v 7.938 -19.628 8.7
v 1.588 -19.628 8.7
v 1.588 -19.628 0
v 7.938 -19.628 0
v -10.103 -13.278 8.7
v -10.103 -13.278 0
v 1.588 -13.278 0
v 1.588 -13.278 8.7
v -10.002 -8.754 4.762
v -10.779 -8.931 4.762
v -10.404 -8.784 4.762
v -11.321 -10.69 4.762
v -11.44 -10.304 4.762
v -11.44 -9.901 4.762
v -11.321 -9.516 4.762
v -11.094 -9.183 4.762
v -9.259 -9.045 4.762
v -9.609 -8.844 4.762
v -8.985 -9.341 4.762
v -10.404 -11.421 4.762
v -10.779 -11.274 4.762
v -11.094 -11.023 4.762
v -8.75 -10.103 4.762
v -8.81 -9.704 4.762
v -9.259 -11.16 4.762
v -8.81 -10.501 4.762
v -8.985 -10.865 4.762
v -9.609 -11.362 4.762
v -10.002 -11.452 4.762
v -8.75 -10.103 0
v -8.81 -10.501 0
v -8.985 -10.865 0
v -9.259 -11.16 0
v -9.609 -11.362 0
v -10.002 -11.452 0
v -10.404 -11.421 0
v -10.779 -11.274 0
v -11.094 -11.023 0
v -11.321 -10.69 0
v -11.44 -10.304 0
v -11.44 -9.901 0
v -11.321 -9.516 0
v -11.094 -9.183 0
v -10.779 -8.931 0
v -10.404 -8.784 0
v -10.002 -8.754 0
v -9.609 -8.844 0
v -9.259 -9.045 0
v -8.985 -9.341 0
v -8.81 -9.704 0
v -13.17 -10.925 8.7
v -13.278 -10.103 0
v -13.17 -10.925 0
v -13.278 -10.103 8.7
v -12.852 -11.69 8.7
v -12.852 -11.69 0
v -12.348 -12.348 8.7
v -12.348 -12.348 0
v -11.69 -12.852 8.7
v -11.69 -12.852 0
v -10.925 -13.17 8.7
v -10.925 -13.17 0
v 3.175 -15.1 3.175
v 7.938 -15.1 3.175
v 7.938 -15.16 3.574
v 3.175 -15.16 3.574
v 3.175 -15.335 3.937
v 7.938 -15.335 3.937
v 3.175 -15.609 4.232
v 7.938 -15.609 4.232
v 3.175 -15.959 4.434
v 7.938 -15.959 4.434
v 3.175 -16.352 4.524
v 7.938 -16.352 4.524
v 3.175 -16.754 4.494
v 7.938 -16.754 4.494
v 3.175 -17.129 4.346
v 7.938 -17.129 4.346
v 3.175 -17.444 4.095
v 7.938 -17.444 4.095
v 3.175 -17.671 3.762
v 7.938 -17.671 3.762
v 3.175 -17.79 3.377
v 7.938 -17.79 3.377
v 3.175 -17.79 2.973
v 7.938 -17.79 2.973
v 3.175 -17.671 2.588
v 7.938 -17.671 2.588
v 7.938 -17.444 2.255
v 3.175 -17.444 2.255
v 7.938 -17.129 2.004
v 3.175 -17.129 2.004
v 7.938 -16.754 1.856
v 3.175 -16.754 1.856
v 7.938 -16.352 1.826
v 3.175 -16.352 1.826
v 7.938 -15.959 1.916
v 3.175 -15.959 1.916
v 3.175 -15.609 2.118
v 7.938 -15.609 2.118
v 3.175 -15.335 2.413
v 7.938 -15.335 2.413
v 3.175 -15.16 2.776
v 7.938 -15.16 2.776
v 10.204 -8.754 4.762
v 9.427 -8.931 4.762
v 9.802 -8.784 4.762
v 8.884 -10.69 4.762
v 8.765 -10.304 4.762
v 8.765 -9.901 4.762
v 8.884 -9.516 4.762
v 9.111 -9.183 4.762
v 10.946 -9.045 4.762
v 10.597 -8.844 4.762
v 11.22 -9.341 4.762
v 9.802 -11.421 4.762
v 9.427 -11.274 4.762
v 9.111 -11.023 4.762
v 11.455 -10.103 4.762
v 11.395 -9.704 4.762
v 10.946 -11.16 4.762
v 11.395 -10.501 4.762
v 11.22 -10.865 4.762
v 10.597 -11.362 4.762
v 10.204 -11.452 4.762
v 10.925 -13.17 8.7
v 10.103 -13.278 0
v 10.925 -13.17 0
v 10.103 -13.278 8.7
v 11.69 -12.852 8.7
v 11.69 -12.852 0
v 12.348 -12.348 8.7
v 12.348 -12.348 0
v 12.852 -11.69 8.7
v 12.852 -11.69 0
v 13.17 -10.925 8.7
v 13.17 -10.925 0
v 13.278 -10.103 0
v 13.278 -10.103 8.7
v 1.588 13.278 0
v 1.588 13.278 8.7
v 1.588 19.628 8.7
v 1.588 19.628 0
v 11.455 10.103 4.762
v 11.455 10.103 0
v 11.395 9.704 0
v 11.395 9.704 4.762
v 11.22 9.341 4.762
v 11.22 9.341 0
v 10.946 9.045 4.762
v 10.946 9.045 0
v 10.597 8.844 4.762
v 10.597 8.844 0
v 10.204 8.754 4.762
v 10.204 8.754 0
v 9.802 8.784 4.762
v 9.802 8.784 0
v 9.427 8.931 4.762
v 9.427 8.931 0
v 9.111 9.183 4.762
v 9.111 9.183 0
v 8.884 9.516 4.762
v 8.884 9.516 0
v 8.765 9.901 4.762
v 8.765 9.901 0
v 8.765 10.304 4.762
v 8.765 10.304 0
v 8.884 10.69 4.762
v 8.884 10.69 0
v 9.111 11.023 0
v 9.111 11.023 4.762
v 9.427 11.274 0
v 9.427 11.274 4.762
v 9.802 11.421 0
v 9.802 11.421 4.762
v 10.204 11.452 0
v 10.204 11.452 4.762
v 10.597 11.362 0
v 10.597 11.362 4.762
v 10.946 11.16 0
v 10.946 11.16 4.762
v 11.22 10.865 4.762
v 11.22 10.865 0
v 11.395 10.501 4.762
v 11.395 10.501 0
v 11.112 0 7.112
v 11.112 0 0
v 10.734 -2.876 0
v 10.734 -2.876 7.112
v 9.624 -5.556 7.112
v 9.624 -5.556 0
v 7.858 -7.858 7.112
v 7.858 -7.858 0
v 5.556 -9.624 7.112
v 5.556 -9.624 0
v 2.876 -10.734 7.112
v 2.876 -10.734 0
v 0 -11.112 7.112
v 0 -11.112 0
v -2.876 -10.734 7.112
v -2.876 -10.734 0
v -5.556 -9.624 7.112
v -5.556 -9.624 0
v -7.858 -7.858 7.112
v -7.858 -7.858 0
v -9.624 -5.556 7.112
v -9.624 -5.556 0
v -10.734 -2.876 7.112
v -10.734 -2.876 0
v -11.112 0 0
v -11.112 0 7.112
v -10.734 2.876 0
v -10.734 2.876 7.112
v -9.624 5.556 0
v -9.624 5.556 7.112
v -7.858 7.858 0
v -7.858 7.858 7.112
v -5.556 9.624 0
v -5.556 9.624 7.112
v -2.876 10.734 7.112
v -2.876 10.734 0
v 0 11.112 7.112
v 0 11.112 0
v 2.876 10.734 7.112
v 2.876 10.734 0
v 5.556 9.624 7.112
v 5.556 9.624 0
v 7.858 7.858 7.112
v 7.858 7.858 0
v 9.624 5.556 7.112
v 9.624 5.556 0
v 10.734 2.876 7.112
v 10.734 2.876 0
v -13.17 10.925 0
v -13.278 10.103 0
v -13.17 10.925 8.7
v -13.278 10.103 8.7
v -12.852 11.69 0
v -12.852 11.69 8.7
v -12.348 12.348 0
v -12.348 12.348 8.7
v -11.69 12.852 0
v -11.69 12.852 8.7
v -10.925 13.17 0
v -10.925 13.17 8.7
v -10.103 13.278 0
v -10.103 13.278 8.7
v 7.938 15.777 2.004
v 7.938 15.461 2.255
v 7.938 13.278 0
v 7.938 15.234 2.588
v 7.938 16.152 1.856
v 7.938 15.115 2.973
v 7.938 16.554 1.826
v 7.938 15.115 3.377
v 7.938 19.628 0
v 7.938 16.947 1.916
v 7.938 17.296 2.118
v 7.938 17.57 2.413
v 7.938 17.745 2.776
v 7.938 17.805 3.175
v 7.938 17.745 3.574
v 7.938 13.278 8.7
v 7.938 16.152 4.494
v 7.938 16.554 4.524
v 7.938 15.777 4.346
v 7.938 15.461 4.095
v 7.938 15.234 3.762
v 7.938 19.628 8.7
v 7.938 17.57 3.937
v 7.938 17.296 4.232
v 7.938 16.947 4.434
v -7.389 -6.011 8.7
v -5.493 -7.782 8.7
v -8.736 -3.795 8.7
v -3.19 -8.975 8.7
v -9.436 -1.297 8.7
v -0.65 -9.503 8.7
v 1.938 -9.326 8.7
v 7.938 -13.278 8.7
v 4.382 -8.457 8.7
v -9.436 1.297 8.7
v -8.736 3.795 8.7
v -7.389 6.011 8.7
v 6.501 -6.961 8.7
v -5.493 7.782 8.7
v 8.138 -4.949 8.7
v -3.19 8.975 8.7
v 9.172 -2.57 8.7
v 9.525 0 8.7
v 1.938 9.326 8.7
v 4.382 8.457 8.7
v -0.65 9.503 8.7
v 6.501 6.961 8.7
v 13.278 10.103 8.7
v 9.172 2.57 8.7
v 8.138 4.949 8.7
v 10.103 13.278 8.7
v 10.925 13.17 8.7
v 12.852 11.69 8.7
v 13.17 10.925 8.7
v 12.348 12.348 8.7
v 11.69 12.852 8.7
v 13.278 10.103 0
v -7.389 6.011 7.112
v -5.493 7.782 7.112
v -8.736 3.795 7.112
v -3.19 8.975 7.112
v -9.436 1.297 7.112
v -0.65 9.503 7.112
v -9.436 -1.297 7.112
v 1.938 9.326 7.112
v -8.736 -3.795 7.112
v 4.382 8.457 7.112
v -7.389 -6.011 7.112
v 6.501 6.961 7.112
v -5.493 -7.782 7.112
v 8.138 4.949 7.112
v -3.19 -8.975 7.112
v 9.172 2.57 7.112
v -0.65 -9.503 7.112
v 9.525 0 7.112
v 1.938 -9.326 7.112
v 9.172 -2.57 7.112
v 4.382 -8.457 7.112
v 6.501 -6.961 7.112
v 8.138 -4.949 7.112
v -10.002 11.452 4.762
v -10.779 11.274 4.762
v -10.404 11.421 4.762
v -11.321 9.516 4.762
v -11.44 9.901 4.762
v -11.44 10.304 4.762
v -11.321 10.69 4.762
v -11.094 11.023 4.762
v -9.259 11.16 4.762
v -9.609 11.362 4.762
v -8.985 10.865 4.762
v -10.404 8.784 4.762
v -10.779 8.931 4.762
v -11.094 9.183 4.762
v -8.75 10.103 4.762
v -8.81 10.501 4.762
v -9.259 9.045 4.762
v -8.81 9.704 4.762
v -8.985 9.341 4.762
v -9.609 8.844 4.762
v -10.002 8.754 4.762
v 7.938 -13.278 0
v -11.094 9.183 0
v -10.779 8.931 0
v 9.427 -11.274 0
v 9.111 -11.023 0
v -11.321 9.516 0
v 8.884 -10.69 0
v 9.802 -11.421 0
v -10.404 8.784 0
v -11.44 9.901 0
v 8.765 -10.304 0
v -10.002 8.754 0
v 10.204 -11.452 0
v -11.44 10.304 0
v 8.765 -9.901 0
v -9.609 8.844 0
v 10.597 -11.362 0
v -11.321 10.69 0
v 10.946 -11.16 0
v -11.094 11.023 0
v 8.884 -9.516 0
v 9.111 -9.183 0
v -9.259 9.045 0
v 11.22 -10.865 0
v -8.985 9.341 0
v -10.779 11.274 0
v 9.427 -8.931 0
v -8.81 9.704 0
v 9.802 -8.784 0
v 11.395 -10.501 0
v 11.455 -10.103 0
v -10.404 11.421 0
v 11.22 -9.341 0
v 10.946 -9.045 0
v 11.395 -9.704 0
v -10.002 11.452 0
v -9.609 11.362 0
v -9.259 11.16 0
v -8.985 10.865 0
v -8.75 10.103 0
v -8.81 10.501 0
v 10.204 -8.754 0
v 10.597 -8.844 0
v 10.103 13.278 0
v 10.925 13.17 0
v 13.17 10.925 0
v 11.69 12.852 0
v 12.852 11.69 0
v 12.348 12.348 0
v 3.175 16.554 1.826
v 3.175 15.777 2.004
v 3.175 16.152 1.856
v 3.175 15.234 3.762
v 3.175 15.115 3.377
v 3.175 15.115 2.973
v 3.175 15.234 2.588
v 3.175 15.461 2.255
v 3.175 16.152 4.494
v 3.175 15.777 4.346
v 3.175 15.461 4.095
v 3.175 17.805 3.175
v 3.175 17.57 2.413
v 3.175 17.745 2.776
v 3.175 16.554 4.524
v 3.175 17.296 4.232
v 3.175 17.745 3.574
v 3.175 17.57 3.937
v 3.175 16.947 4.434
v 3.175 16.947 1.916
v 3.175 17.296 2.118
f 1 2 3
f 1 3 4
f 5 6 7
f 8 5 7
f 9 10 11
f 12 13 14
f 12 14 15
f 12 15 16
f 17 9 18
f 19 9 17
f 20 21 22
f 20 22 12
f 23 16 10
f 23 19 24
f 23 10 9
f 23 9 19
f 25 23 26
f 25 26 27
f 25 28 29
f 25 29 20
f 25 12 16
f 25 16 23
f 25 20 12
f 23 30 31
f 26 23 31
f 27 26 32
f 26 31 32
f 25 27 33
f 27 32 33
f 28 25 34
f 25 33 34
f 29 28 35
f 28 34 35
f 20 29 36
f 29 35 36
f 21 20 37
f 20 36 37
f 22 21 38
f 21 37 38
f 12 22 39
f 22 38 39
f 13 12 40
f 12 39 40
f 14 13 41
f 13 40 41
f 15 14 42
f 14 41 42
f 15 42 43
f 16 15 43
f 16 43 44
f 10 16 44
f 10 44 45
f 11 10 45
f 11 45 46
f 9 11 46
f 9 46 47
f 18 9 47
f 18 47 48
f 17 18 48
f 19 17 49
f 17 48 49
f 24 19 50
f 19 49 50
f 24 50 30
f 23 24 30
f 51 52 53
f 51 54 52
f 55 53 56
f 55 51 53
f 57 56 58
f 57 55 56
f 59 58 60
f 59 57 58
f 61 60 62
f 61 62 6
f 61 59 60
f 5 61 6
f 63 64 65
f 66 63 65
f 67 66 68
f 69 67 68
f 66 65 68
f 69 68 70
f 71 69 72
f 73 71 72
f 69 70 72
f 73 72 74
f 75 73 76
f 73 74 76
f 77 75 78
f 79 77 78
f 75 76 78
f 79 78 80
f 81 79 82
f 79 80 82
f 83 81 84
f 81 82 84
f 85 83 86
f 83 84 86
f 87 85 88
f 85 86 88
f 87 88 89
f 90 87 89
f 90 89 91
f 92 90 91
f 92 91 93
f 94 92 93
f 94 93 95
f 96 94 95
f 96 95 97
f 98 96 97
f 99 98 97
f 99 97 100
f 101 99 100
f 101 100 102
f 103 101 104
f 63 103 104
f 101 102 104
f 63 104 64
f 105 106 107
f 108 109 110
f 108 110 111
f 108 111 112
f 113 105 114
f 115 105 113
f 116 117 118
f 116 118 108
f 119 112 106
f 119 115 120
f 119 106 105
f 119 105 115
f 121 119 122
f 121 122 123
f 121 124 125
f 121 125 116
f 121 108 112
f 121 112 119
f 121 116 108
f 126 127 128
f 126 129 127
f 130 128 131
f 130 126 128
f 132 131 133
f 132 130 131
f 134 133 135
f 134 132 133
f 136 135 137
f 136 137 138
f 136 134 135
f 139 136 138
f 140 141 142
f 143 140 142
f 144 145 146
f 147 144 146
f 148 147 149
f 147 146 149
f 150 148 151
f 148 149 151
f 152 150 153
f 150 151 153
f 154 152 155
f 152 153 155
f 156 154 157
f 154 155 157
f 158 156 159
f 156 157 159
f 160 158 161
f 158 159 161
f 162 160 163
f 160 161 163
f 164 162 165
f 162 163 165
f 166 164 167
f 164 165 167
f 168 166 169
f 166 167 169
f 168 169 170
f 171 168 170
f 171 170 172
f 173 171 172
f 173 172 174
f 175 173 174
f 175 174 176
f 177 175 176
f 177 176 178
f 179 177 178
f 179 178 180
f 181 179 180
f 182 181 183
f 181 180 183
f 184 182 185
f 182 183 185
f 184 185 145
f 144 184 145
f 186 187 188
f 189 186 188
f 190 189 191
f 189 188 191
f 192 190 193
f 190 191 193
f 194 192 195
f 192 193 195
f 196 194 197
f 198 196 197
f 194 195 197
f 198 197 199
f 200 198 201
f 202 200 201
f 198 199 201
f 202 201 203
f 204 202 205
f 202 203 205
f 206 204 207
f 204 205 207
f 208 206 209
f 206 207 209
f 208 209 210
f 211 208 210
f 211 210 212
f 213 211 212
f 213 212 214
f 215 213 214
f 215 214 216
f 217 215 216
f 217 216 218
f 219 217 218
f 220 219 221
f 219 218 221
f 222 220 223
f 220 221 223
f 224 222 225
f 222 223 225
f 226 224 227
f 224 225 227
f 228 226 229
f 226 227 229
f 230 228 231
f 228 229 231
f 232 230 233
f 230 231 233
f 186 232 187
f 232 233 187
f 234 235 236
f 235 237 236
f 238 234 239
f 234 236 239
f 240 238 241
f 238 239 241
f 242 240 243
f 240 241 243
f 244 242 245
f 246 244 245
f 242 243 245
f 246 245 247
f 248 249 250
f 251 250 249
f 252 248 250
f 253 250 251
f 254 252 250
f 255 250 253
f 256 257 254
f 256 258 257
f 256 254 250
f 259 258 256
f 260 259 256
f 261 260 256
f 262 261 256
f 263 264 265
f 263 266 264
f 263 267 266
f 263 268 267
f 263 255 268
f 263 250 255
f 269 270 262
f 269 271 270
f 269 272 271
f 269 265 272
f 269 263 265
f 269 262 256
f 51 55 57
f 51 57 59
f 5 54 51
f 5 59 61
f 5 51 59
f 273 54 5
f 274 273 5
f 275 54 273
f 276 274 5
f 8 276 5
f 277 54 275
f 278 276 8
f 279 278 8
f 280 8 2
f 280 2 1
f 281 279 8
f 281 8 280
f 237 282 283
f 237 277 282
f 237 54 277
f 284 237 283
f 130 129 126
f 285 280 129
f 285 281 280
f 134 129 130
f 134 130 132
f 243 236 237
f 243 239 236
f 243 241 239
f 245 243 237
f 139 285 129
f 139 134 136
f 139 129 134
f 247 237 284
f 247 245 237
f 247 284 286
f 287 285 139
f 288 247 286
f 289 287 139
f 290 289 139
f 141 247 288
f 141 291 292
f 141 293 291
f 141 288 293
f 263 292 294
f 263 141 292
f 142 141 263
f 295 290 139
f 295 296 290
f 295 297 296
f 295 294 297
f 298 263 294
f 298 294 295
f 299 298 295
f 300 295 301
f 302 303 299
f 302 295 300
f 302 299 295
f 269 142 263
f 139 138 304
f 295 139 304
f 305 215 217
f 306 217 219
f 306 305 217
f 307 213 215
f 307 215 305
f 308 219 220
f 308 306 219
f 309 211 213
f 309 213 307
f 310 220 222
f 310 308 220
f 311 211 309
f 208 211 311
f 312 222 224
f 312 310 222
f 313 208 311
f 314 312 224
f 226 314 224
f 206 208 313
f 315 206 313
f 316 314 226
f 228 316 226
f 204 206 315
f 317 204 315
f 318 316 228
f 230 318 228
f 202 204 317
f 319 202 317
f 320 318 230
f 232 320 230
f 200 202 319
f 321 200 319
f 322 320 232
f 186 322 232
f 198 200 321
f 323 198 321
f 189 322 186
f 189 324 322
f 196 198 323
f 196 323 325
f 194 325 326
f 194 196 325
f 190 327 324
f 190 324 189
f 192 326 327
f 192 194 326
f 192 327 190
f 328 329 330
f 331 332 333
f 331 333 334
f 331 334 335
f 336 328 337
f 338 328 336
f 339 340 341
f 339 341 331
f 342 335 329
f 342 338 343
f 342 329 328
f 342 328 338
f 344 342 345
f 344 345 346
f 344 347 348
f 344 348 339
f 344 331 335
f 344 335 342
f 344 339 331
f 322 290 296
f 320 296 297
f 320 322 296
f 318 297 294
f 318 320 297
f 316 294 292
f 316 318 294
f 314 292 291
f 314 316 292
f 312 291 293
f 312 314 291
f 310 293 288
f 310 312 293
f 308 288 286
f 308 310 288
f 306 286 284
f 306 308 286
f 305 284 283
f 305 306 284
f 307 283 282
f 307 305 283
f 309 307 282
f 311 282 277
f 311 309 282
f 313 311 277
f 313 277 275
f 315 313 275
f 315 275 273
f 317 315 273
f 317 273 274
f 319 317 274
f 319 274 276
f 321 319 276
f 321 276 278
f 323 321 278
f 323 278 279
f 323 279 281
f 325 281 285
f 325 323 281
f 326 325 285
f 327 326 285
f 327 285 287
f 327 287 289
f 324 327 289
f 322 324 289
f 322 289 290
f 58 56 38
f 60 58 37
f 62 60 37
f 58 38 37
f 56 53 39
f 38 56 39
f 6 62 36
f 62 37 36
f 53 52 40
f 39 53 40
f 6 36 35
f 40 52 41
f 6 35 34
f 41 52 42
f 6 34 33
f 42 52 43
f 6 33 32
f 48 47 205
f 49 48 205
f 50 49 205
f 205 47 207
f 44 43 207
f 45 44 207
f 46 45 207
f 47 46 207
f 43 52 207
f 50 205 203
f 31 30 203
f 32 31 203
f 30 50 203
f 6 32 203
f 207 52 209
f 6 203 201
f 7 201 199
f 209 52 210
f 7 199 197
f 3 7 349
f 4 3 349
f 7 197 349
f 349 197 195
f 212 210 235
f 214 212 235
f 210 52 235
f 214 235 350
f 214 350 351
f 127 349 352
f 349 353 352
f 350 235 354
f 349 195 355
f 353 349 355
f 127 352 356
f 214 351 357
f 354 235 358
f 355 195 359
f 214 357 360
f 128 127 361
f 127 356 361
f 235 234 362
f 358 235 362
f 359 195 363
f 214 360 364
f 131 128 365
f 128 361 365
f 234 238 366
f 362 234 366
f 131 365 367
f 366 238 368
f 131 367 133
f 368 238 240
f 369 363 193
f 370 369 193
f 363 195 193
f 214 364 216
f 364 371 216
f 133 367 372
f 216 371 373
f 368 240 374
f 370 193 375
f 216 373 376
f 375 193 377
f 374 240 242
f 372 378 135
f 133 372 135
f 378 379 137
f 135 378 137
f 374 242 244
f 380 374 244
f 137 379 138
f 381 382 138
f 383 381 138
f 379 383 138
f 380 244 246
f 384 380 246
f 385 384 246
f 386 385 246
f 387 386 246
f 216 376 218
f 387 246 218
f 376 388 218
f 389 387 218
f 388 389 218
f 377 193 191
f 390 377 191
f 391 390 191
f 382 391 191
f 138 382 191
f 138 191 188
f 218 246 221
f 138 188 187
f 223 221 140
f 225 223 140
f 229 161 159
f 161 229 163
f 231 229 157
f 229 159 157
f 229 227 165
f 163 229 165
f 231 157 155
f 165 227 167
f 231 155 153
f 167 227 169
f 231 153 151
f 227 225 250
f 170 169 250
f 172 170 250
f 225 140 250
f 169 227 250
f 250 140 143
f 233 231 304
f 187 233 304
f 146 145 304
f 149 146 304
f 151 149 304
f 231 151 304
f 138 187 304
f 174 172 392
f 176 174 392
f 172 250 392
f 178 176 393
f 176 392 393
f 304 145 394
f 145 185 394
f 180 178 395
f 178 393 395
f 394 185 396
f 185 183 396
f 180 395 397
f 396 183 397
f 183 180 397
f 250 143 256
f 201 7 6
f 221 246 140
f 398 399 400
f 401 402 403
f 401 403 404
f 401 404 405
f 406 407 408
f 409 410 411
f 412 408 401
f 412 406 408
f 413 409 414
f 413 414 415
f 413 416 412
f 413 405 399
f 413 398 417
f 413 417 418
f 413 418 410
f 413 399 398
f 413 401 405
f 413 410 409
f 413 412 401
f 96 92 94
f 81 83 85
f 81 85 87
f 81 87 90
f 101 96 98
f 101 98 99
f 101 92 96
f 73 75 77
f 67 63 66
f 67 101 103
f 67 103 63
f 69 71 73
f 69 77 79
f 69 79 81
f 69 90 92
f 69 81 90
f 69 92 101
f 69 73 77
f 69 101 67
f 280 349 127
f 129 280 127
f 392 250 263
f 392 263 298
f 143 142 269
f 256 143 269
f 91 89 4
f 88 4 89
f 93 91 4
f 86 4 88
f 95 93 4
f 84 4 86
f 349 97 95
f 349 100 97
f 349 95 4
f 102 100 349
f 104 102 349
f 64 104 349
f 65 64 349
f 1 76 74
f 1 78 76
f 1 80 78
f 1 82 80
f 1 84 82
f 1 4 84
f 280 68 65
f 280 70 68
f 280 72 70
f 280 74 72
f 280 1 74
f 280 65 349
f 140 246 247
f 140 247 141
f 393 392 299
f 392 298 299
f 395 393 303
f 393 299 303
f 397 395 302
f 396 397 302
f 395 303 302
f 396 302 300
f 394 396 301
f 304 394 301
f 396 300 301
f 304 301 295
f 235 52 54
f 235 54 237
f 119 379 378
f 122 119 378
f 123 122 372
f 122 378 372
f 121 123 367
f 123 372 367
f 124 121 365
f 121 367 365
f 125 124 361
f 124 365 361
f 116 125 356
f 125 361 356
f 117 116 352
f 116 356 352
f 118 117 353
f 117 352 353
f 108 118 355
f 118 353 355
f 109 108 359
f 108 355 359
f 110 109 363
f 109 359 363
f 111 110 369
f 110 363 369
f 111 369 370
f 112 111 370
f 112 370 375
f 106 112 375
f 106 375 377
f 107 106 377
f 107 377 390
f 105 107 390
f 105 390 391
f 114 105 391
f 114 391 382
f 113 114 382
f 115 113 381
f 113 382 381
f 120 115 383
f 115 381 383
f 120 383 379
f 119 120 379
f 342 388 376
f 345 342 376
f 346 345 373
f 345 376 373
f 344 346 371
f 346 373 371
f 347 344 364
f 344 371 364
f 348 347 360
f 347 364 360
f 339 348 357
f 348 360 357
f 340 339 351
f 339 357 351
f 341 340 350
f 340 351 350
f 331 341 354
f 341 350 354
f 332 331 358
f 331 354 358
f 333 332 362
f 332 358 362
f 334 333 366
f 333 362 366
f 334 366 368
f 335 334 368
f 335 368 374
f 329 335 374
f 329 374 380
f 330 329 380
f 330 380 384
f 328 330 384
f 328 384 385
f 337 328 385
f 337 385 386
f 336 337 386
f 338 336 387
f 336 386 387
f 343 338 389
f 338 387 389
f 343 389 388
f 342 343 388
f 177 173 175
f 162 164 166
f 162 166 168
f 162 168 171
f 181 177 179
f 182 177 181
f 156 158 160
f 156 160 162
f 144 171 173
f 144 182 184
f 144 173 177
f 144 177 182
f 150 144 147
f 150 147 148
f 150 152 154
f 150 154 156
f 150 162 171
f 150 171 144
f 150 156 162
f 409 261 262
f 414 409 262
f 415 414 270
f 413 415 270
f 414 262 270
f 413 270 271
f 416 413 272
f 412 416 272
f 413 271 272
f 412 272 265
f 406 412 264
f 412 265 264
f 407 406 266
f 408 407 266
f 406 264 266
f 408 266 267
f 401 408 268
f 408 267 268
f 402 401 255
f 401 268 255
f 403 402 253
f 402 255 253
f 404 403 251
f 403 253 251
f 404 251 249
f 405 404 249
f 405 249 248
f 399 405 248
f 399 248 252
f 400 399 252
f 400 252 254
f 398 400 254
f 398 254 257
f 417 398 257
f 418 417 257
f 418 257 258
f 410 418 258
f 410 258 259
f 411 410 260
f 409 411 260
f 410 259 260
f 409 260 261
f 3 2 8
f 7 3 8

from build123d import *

# Parameters (mm, degrees)
F0_W      = 26.555576
F0_H      = 26.555576
F0_R      = 9.525
F1_DEPTH  = 8.6995
F2_R      = 3.175
F3_R      = 11.1125
F4_DEPTH  = 7.112
F5_R      = 1.35255
F6_DEPTH  = 4.7625
F7_W      = 6.35
F7_H      = 6.35
F8_DEPTH  = 8.6995
F9_R      = 1.35255
F10_DEPTH = 4.7625


with BuildPart() as f1:
    # F0 (on Top) → F1 (new body)
    with BuildSketch(Plane.XY):
        Rectangle(F0_W, F0_H)
        Circle(F0_R, mode=Mode.SUBTRACT)
    extrude(amount=F1_DEPTH)

    # F2
    f2_edges = [f1.edges().sort_by_distance(p)[0] for p in [
        (-13.277788, 13.277788, 4.34975),
        (-13.277788, -13.277788, 4.34975),
        (13.277788, -13.277788, 4.34975),
        (13.277788, 13.277788, 4.34975),
    ]]
    fillet(f2_edges, radius=F2_R)

    # F3 (on face) → F4 (cut)
    with BuildSketch(Plane(origin=(0, 0, 0), x_dir=(1, 0, 0), z_dir=(0, 0, -1))):
        Circle(F3_R)
    extrude(amount=-F4_DEPTH, mode=Mode.SUBTRACT)

    # F5 (on face) → F6 (cut)
    with BuildSketch(Plane(origin=(0, 0, 0), x_dir=(1, 0, 0), z_dir=(0, 0, -1))):
        with Locations((10.102788, 10.102788)):
            Circle(F5_R)
        with Locations((-10.102788, 10.102788)):
            Circle(F5_R)
        with Locations((-10.102788, -10.102788)):
            Circle(F5_R)
        with Locations((10.102788, -10.102788)):
            Circle(F5_R)
    extrude(amount=-F6_DEPTH, mode=Mode.SUBTRACT)

    # F7 (on face) → F8 (join, through all)
    with BuildSketch(Plane.XY.offset(8.6995)):
        with Locations((4.7625, -16.452788)):
            Rectangle(F7_W, F7_H)
        with Locations((4.7625, 16.452788)):
            Rectangle(F7_W, F7_H)
    extrude(amount=-F8_DEPTH)

    # F9 (on face) → F10 (cut)
    with BuildSketch(Plane.YZ.offset(7.9375)):
        with Locations((16.452788, 3.175)):
            Circle(F9_R)
        with Locations((-16.452788, 3.175)):
            Circle(F9_R)
    extrude(amount=-F10_DEPTH, mode=Mode.SUBTRACT)


solid = f1.part
